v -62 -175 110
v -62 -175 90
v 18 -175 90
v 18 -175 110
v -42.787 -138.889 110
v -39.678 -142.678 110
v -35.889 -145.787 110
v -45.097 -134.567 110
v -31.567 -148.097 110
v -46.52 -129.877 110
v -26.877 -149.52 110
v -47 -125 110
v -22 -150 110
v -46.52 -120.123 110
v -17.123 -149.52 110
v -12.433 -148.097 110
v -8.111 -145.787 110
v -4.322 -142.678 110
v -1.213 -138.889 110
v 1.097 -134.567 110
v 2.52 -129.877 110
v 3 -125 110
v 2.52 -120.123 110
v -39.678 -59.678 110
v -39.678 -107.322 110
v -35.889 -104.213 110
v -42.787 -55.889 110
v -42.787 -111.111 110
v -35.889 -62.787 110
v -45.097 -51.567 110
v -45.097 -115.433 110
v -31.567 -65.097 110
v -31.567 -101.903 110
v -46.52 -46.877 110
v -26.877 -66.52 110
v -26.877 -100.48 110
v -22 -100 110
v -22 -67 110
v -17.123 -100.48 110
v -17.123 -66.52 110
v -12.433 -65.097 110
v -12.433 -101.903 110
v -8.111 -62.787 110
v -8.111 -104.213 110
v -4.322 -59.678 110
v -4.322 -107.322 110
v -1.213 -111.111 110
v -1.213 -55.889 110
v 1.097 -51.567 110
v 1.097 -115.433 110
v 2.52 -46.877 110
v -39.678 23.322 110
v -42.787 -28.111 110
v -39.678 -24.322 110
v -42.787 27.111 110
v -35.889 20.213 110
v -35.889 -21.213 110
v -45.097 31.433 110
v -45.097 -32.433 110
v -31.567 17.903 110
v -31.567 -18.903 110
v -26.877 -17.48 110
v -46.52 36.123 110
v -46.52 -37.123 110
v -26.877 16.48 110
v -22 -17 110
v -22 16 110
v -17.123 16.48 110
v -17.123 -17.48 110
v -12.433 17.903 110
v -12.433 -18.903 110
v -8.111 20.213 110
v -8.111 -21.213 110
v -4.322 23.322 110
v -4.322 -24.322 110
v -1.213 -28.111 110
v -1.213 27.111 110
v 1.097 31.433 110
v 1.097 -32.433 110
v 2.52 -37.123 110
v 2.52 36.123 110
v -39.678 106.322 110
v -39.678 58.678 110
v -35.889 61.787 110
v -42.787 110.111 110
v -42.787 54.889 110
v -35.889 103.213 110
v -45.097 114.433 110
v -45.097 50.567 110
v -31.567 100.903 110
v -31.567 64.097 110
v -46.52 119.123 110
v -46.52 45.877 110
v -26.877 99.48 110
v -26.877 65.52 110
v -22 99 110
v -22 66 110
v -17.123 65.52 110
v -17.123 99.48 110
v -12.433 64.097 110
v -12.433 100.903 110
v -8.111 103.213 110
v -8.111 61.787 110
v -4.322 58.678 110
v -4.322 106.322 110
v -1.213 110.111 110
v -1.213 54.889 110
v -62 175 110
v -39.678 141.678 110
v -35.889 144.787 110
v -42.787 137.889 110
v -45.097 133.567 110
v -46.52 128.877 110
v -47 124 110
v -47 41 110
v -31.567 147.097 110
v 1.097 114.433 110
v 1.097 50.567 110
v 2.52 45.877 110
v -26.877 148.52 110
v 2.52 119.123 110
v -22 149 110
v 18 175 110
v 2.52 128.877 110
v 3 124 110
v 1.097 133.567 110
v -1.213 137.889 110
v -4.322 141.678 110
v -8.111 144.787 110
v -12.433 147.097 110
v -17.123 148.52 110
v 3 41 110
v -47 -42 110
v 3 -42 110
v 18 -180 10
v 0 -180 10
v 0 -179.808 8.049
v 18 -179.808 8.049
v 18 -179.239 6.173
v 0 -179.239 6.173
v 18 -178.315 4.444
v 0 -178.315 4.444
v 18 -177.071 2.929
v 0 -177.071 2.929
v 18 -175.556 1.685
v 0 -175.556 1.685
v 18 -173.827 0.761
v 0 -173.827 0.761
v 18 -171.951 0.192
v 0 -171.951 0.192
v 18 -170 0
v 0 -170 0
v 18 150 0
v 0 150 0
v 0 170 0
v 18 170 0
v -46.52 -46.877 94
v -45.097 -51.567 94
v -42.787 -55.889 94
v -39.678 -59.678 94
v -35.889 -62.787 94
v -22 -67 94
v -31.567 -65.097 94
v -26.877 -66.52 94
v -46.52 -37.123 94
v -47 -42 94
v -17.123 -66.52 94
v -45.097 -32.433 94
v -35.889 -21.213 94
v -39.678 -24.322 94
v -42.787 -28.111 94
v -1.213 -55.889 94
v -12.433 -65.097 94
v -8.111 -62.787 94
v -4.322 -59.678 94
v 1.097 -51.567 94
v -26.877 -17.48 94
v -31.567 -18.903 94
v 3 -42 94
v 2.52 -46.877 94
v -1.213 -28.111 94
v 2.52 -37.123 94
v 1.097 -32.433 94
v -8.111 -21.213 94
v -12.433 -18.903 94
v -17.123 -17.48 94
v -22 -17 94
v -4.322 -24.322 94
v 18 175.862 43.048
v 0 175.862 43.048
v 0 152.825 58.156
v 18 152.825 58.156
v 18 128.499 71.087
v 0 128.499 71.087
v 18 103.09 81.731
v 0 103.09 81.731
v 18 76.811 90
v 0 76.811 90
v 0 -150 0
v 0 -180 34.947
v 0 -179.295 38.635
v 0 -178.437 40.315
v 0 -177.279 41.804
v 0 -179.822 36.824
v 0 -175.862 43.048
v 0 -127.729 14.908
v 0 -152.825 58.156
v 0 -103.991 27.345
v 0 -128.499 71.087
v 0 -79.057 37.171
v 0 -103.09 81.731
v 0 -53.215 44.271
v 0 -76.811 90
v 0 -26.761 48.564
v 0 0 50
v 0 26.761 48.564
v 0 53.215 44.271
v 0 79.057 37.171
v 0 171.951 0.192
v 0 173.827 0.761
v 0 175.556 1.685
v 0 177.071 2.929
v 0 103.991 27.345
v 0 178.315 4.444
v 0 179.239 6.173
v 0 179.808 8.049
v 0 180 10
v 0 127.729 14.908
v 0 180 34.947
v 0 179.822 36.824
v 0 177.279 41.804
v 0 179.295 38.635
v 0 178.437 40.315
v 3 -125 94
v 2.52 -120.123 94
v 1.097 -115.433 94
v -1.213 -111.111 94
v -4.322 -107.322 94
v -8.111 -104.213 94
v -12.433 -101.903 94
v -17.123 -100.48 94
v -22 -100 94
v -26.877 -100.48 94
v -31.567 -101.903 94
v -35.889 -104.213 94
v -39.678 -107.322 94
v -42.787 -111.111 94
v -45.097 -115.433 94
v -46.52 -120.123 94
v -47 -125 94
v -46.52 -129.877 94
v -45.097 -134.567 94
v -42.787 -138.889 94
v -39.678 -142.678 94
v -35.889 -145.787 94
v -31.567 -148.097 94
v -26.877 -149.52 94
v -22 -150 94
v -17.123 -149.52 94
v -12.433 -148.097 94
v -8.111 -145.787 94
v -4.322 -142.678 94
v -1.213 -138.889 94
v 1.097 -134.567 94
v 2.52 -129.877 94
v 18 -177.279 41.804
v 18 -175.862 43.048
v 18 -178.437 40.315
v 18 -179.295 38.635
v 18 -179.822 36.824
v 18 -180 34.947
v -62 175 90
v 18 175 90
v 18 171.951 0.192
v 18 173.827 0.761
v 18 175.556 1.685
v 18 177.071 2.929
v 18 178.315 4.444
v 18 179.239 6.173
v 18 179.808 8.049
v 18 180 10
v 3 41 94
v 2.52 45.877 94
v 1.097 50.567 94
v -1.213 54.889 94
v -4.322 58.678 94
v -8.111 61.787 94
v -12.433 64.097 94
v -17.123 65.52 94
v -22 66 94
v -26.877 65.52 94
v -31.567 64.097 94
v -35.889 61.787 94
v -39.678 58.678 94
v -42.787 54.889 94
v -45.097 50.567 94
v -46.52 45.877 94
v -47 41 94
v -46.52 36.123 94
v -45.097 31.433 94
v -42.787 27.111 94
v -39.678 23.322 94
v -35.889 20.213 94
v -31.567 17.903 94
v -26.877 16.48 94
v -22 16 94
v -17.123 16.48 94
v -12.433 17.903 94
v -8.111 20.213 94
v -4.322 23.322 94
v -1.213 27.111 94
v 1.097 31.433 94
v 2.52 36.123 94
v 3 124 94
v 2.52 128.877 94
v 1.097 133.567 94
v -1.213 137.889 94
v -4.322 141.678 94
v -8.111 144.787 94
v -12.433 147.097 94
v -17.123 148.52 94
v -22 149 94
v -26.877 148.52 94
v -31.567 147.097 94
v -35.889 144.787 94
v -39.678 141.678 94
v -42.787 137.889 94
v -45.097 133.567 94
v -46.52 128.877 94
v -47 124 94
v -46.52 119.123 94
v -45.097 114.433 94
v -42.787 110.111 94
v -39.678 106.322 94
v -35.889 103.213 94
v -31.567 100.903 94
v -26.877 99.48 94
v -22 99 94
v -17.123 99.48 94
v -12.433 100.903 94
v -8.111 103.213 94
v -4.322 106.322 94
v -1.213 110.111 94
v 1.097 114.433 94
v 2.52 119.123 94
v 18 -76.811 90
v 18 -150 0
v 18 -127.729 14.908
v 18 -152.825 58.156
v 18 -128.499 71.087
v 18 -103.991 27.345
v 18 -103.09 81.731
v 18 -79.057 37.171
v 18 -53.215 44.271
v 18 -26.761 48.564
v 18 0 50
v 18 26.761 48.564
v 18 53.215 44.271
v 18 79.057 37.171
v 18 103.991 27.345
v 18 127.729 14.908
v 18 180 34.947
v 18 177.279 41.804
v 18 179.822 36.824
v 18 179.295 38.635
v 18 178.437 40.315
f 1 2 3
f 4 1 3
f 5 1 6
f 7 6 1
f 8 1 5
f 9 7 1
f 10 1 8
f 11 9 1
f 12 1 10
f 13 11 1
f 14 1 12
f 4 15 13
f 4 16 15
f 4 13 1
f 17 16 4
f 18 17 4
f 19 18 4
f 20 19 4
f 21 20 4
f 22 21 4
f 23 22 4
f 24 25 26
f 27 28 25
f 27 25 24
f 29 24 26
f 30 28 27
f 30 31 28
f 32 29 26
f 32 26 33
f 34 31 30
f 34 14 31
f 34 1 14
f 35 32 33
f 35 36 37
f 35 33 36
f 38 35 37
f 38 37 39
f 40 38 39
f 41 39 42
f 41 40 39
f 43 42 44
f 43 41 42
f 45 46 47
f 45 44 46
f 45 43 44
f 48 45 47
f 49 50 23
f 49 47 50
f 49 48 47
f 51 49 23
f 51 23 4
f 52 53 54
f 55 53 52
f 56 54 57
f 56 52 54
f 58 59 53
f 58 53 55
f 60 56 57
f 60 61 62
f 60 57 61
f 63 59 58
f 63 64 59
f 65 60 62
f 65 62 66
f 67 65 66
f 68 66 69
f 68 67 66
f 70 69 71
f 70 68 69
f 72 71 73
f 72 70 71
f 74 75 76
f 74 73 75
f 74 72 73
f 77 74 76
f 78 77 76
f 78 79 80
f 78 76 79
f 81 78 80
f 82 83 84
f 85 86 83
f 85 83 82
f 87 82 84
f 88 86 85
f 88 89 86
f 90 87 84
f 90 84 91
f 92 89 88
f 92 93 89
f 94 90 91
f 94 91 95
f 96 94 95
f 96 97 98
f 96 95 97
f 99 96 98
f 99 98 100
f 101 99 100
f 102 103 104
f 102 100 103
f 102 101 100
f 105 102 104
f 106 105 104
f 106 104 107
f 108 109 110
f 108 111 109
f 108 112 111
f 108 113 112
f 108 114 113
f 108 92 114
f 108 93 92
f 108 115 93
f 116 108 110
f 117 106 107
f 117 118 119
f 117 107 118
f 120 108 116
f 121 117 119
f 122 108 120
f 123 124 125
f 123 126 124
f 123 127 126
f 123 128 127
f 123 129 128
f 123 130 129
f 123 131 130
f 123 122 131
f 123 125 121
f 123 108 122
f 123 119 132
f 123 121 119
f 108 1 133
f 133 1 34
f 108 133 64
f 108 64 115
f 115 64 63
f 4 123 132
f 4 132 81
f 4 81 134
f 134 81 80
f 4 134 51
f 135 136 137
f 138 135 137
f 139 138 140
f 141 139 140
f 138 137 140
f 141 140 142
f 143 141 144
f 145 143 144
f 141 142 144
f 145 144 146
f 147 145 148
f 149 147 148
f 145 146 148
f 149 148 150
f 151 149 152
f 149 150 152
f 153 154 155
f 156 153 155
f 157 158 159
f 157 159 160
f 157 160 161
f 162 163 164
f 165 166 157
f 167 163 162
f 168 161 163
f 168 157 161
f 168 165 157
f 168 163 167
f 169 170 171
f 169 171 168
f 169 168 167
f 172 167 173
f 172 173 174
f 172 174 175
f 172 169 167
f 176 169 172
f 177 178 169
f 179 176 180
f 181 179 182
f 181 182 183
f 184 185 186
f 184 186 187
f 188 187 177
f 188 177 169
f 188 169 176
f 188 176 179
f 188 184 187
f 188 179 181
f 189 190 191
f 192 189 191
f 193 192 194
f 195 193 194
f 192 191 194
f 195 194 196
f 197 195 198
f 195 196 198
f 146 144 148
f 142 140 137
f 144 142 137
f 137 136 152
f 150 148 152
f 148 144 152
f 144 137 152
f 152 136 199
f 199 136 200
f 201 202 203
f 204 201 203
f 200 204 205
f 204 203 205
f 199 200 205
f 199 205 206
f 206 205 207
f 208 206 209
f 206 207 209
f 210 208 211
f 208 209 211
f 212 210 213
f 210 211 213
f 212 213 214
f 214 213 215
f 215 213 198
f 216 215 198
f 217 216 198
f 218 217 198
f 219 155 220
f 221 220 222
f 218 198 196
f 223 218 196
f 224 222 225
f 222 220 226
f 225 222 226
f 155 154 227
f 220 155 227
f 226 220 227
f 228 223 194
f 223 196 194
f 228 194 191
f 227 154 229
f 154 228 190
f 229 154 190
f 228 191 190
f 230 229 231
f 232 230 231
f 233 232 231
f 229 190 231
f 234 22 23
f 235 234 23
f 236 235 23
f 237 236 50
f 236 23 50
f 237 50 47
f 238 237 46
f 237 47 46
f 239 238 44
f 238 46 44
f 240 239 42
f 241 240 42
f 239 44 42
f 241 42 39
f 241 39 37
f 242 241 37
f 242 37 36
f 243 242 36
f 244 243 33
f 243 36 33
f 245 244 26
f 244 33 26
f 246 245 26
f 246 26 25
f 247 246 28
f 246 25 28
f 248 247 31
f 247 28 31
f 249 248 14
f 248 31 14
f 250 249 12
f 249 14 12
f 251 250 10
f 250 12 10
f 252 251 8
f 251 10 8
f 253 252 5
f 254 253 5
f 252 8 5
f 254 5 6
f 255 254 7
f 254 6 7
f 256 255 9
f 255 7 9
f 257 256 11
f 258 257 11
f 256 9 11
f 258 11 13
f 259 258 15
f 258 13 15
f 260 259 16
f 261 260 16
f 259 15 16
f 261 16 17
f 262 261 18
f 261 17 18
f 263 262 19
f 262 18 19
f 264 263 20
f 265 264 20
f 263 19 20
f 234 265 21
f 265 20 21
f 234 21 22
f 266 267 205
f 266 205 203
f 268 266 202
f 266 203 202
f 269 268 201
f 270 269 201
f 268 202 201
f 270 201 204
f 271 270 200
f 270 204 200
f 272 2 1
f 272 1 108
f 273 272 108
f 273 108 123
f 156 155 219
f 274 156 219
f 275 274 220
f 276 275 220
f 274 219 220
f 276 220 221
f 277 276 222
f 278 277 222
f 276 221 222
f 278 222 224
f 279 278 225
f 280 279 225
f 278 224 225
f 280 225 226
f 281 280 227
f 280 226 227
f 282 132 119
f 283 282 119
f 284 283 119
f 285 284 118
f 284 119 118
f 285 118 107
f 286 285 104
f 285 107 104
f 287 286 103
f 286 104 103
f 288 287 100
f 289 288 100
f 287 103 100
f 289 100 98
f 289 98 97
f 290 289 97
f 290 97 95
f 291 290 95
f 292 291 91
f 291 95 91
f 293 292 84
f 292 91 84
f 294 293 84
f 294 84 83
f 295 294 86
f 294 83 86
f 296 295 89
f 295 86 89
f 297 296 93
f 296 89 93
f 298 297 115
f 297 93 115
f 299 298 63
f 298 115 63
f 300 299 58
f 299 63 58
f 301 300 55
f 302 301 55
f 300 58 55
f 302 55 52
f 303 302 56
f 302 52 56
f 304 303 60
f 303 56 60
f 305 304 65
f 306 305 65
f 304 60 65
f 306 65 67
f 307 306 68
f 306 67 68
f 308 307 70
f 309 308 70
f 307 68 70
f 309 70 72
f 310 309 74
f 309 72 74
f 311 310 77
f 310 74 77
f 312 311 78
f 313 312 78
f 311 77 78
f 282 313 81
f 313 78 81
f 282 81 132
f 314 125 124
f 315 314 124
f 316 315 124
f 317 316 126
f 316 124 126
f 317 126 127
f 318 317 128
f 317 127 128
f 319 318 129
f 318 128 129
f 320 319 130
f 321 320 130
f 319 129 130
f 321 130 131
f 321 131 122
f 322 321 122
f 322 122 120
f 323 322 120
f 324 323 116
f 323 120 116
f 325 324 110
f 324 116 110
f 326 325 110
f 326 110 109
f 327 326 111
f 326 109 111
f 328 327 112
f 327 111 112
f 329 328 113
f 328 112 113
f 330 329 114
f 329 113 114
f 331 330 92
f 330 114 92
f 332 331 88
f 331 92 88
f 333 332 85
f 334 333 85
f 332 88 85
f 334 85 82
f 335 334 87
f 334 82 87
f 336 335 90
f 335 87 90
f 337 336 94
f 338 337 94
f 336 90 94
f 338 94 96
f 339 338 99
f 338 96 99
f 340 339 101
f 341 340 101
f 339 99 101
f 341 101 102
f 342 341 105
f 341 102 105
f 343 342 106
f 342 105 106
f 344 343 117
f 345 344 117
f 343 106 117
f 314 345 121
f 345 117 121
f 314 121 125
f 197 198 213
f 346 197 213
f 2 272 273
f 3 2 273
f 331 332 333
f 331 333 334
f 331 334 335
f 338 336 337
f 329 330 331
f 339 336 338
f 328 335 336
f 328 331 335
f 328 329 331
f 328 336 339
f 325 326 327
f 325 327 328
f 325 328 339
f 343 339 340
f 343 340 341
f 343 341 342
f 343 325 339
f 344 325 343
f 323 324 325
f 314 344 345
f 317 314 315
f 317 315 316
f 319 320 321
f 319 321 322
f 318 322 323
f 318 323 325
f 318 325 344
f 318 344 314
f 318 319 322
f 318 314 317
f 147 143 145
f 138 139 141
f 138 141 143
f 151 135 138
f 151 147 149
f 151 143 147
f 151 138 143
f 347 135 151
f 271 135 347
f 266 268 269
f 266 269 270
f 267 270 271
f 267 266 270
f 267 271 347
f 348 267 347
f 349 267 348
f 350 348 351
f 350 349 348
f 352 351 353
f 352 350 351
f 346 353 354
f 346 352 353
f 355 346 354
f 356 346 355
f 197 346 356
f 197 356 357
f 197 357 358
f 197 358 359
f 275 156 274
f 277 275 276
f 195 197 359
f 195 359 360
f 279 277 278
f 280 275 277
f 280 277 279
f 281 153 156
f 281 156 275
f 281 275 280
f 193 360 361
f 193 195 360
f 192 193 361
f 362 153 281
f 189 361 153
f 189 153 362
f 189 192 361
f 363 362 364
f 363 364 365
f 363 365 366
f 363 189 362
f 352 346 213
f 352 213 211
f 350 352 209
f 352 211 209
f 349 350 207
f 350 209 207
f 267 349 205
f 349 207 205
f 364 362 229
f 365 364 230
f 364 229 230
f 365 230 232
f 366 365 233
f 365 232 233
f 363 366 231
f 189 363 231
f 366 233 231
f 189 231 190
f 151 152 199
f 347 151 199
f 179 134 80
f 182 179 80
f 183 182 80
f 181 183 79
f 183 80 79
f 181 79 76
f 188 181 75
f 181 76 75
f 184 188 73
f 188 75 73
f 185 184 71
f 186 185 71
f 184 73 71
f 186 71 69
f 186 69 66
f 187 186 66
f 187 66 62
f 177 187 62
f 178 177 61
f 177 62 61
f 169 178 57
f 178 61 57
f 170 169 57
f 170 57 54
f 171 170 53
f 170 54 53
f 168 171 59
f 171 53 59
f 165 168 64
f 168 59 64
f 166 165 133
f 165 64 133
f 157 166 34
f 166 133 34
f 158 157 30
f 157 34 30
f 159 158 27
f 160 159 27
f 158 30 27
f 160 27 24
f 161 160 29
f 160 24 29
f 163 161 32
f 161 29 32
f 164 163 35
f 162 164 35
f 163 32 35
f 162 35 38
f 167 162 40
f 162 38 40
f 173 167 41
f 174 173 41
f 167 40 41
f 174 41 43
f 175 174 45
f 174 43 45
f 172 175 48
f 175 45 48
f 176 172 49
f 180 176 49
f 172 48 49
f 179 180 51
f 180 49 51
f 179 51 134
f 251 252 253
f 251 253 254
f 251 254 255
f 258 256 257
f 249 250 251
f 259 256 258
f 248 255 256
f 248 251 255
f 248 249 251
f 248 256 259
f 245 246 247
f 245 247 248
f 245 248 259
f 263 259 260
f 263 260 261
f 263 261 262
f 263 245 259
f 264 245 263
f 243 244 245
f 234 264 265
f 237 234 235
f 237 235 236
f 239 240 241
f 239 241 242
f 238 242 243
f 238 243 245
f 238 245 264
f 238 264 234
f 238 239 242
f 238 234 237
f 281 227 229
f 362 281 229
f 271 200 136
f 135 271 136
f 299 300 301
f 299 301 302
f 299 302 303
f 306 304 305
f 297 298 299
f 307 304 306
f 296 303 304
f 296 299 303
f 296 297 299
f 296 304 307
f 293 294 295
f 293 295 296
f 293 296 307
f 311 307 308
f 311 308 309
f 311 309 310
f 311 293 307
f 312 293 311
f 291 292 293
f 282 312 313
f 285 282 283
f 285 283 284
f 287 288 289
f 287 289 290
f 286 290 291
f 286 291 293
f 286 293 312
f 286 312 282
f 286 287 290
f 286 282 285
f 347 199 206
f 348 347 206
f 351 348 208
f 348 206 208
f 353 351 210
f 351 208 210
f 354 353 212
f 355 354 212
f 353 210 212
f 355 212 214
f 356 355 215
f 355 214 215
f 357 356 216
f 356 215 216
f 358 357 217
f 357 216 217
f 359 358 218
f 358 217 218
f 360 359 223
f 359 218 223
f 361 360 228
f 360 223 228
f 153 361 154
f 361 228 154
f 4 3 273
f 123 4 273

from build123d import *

# Parameters (mm, degrees)
F1_DEPTH = 18
F2_W     = 80
F2_H     = 350
F3_DEPTH = 20
F4_R     = 25
F5_DEPTH = 16


with BuildPart() as f1:
    # F0 (on Right) → F1 (new body)
    with BuildSketch(Plane.YZ):
        with BuildLine():
            ThreePointArc((-150, 0), (0, 50), (150, 0))
            Line((150, 0), (170, 0))
            ThreePointArc((170, 0), (177.071068, 2.928932), (180, 10))
            Line((180, 10), (180, 34.946802))
            ThreePointArc((180, 34.946802), (178.905636, 39.495391), (175.862069, 43.048416))
            ThreePointArc((175.862069, 43.048416), (128.49938, 71.086535), (76.811457, 90))
            Line((76.811457, 90), (-76.811457, 90))
            ThreePointArc((-76.811457, 90), (-128.49938, 71.086535), (-175.862069, 43.048416))
            ThreePointArc((-175.862069, 43.048416), (-178.905636, 39.495391), (-180, 34.946802))
            Line((-180, 34.946802), (-180, 10))
            ThreePointArc((-180, 10), (-177.071068, 2.928932), (-170, 0))
            Line((-170, 0), (-150, 0))
        make_face()
    extrude(amount=F1_DEPTH)


with BuildPart() as f3:
    # F2 (on face) → F3 (new body)
    with BuildSketch(Plane.XY.offset(90)):
        with Locations((-22, 0)):
            Rectangle(F2_W, F2_H)
    extrude(amount=F3_DEPTH)

    # F4 (on face) → F5 (cut)
    with BuildSketch(Plane.XY.offset(110)):
        with Locations((-22, -125)):
            Circle(F4_R)
        with Locations((-22, -42)):
            Circle(F4_R)
        with Locations((-22, 41)):
            Circle(F4_R)
        with Locations((-22, 124)):
            Circle(F4_R)
    extrude(amount=-F5_DEPTH, mode=Mode.SUBTRACT)


solid = Compound([f1.part, f3.part])
